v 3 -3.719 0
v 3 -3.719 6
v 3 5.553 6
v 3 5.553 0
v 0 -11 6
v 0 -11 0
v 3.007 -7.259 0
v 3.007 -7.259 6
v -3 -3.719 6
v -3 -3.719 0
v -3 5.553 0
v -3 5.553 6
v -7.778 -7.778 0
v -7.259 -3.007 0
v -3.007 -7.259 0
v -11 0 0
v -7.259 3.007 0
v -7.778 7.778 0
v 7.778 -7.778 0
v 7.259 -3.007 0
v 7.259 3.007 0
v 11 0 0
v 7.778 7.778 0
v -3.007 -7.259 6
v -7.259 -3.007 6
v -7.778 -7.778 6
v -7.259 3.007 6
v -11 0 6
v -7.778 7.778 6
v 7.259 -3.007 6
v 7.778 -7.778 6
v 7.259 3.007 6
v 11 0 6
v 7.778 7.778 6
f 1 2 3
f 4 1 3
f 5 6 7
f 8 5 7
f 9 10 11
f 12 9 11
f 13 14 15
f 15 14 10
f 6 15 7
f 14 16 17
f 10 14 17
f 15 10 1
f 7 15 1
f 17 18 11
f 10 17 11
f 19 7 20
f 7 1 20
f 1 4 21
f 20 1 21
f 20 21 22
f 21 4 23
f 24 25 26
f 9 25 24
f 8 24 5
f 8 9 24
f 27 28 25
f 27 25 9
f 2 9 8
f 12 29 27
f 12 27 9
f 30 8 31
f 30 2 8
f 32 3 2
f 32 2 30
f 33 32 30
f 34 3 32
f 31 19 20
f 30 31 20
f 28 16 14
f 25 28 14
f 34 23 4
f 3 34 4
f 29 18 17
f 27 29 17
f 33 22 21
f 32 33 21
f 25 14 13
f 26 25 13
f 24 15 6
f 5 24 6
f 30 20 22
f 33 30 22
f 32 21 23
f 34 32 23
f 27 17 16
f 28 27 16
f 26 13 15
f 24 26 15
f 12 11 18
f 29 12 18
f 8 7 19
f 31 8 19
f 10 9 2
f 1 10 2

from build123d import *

# Parameters (mm, degrees)
RESSALTO_EXTRUS_O1_DEPTH = 6
ESBO_O2_W                = 6
ESBO_O2_H                = 6
CORTE_EXTRUS_O1_DEPTH    = 10


with BuildPart() as part:
    # Esboço1 → Ressalto-extrusão1 (new body)
    with BuildSketch(Plane.XY):
        Polygon((3, 2.28086846), (-3, 2.28086846), (-3, 5.552723944), (-7.778174593, 7.778174593), (-7.259013875, 3.006781996), (-11, 0), (-7.259060972, -3.006840593), (-7.778167576, -7.778239077), (-3.006781996, -7.259013875), (0, -11), (3.006781996, -7.259013875), (7.778174593, -7.778174593), (7.259013875, -3.006781996), (11, 0), (7.259013875, 3.006781996), (7.778174593, 7.778174593), (3, 5.552723944), align=None)
    extrude(amount=RESSALTO_EXTRUS_O1_DEPTH)

    # Esboço2 → Corte-extrusão1 (cut)
    with BuildSketch(Plane.XY.offset(6)):
        with Locations((0, -0.71913154)):
            Rectangle(ESBO_O2_W, ESBO_O2_H)
    extrude(amount=-CORTE_EXTRUS_O1_DEPTH, mode=Mode.SUBTRACT)


solid = part.part
